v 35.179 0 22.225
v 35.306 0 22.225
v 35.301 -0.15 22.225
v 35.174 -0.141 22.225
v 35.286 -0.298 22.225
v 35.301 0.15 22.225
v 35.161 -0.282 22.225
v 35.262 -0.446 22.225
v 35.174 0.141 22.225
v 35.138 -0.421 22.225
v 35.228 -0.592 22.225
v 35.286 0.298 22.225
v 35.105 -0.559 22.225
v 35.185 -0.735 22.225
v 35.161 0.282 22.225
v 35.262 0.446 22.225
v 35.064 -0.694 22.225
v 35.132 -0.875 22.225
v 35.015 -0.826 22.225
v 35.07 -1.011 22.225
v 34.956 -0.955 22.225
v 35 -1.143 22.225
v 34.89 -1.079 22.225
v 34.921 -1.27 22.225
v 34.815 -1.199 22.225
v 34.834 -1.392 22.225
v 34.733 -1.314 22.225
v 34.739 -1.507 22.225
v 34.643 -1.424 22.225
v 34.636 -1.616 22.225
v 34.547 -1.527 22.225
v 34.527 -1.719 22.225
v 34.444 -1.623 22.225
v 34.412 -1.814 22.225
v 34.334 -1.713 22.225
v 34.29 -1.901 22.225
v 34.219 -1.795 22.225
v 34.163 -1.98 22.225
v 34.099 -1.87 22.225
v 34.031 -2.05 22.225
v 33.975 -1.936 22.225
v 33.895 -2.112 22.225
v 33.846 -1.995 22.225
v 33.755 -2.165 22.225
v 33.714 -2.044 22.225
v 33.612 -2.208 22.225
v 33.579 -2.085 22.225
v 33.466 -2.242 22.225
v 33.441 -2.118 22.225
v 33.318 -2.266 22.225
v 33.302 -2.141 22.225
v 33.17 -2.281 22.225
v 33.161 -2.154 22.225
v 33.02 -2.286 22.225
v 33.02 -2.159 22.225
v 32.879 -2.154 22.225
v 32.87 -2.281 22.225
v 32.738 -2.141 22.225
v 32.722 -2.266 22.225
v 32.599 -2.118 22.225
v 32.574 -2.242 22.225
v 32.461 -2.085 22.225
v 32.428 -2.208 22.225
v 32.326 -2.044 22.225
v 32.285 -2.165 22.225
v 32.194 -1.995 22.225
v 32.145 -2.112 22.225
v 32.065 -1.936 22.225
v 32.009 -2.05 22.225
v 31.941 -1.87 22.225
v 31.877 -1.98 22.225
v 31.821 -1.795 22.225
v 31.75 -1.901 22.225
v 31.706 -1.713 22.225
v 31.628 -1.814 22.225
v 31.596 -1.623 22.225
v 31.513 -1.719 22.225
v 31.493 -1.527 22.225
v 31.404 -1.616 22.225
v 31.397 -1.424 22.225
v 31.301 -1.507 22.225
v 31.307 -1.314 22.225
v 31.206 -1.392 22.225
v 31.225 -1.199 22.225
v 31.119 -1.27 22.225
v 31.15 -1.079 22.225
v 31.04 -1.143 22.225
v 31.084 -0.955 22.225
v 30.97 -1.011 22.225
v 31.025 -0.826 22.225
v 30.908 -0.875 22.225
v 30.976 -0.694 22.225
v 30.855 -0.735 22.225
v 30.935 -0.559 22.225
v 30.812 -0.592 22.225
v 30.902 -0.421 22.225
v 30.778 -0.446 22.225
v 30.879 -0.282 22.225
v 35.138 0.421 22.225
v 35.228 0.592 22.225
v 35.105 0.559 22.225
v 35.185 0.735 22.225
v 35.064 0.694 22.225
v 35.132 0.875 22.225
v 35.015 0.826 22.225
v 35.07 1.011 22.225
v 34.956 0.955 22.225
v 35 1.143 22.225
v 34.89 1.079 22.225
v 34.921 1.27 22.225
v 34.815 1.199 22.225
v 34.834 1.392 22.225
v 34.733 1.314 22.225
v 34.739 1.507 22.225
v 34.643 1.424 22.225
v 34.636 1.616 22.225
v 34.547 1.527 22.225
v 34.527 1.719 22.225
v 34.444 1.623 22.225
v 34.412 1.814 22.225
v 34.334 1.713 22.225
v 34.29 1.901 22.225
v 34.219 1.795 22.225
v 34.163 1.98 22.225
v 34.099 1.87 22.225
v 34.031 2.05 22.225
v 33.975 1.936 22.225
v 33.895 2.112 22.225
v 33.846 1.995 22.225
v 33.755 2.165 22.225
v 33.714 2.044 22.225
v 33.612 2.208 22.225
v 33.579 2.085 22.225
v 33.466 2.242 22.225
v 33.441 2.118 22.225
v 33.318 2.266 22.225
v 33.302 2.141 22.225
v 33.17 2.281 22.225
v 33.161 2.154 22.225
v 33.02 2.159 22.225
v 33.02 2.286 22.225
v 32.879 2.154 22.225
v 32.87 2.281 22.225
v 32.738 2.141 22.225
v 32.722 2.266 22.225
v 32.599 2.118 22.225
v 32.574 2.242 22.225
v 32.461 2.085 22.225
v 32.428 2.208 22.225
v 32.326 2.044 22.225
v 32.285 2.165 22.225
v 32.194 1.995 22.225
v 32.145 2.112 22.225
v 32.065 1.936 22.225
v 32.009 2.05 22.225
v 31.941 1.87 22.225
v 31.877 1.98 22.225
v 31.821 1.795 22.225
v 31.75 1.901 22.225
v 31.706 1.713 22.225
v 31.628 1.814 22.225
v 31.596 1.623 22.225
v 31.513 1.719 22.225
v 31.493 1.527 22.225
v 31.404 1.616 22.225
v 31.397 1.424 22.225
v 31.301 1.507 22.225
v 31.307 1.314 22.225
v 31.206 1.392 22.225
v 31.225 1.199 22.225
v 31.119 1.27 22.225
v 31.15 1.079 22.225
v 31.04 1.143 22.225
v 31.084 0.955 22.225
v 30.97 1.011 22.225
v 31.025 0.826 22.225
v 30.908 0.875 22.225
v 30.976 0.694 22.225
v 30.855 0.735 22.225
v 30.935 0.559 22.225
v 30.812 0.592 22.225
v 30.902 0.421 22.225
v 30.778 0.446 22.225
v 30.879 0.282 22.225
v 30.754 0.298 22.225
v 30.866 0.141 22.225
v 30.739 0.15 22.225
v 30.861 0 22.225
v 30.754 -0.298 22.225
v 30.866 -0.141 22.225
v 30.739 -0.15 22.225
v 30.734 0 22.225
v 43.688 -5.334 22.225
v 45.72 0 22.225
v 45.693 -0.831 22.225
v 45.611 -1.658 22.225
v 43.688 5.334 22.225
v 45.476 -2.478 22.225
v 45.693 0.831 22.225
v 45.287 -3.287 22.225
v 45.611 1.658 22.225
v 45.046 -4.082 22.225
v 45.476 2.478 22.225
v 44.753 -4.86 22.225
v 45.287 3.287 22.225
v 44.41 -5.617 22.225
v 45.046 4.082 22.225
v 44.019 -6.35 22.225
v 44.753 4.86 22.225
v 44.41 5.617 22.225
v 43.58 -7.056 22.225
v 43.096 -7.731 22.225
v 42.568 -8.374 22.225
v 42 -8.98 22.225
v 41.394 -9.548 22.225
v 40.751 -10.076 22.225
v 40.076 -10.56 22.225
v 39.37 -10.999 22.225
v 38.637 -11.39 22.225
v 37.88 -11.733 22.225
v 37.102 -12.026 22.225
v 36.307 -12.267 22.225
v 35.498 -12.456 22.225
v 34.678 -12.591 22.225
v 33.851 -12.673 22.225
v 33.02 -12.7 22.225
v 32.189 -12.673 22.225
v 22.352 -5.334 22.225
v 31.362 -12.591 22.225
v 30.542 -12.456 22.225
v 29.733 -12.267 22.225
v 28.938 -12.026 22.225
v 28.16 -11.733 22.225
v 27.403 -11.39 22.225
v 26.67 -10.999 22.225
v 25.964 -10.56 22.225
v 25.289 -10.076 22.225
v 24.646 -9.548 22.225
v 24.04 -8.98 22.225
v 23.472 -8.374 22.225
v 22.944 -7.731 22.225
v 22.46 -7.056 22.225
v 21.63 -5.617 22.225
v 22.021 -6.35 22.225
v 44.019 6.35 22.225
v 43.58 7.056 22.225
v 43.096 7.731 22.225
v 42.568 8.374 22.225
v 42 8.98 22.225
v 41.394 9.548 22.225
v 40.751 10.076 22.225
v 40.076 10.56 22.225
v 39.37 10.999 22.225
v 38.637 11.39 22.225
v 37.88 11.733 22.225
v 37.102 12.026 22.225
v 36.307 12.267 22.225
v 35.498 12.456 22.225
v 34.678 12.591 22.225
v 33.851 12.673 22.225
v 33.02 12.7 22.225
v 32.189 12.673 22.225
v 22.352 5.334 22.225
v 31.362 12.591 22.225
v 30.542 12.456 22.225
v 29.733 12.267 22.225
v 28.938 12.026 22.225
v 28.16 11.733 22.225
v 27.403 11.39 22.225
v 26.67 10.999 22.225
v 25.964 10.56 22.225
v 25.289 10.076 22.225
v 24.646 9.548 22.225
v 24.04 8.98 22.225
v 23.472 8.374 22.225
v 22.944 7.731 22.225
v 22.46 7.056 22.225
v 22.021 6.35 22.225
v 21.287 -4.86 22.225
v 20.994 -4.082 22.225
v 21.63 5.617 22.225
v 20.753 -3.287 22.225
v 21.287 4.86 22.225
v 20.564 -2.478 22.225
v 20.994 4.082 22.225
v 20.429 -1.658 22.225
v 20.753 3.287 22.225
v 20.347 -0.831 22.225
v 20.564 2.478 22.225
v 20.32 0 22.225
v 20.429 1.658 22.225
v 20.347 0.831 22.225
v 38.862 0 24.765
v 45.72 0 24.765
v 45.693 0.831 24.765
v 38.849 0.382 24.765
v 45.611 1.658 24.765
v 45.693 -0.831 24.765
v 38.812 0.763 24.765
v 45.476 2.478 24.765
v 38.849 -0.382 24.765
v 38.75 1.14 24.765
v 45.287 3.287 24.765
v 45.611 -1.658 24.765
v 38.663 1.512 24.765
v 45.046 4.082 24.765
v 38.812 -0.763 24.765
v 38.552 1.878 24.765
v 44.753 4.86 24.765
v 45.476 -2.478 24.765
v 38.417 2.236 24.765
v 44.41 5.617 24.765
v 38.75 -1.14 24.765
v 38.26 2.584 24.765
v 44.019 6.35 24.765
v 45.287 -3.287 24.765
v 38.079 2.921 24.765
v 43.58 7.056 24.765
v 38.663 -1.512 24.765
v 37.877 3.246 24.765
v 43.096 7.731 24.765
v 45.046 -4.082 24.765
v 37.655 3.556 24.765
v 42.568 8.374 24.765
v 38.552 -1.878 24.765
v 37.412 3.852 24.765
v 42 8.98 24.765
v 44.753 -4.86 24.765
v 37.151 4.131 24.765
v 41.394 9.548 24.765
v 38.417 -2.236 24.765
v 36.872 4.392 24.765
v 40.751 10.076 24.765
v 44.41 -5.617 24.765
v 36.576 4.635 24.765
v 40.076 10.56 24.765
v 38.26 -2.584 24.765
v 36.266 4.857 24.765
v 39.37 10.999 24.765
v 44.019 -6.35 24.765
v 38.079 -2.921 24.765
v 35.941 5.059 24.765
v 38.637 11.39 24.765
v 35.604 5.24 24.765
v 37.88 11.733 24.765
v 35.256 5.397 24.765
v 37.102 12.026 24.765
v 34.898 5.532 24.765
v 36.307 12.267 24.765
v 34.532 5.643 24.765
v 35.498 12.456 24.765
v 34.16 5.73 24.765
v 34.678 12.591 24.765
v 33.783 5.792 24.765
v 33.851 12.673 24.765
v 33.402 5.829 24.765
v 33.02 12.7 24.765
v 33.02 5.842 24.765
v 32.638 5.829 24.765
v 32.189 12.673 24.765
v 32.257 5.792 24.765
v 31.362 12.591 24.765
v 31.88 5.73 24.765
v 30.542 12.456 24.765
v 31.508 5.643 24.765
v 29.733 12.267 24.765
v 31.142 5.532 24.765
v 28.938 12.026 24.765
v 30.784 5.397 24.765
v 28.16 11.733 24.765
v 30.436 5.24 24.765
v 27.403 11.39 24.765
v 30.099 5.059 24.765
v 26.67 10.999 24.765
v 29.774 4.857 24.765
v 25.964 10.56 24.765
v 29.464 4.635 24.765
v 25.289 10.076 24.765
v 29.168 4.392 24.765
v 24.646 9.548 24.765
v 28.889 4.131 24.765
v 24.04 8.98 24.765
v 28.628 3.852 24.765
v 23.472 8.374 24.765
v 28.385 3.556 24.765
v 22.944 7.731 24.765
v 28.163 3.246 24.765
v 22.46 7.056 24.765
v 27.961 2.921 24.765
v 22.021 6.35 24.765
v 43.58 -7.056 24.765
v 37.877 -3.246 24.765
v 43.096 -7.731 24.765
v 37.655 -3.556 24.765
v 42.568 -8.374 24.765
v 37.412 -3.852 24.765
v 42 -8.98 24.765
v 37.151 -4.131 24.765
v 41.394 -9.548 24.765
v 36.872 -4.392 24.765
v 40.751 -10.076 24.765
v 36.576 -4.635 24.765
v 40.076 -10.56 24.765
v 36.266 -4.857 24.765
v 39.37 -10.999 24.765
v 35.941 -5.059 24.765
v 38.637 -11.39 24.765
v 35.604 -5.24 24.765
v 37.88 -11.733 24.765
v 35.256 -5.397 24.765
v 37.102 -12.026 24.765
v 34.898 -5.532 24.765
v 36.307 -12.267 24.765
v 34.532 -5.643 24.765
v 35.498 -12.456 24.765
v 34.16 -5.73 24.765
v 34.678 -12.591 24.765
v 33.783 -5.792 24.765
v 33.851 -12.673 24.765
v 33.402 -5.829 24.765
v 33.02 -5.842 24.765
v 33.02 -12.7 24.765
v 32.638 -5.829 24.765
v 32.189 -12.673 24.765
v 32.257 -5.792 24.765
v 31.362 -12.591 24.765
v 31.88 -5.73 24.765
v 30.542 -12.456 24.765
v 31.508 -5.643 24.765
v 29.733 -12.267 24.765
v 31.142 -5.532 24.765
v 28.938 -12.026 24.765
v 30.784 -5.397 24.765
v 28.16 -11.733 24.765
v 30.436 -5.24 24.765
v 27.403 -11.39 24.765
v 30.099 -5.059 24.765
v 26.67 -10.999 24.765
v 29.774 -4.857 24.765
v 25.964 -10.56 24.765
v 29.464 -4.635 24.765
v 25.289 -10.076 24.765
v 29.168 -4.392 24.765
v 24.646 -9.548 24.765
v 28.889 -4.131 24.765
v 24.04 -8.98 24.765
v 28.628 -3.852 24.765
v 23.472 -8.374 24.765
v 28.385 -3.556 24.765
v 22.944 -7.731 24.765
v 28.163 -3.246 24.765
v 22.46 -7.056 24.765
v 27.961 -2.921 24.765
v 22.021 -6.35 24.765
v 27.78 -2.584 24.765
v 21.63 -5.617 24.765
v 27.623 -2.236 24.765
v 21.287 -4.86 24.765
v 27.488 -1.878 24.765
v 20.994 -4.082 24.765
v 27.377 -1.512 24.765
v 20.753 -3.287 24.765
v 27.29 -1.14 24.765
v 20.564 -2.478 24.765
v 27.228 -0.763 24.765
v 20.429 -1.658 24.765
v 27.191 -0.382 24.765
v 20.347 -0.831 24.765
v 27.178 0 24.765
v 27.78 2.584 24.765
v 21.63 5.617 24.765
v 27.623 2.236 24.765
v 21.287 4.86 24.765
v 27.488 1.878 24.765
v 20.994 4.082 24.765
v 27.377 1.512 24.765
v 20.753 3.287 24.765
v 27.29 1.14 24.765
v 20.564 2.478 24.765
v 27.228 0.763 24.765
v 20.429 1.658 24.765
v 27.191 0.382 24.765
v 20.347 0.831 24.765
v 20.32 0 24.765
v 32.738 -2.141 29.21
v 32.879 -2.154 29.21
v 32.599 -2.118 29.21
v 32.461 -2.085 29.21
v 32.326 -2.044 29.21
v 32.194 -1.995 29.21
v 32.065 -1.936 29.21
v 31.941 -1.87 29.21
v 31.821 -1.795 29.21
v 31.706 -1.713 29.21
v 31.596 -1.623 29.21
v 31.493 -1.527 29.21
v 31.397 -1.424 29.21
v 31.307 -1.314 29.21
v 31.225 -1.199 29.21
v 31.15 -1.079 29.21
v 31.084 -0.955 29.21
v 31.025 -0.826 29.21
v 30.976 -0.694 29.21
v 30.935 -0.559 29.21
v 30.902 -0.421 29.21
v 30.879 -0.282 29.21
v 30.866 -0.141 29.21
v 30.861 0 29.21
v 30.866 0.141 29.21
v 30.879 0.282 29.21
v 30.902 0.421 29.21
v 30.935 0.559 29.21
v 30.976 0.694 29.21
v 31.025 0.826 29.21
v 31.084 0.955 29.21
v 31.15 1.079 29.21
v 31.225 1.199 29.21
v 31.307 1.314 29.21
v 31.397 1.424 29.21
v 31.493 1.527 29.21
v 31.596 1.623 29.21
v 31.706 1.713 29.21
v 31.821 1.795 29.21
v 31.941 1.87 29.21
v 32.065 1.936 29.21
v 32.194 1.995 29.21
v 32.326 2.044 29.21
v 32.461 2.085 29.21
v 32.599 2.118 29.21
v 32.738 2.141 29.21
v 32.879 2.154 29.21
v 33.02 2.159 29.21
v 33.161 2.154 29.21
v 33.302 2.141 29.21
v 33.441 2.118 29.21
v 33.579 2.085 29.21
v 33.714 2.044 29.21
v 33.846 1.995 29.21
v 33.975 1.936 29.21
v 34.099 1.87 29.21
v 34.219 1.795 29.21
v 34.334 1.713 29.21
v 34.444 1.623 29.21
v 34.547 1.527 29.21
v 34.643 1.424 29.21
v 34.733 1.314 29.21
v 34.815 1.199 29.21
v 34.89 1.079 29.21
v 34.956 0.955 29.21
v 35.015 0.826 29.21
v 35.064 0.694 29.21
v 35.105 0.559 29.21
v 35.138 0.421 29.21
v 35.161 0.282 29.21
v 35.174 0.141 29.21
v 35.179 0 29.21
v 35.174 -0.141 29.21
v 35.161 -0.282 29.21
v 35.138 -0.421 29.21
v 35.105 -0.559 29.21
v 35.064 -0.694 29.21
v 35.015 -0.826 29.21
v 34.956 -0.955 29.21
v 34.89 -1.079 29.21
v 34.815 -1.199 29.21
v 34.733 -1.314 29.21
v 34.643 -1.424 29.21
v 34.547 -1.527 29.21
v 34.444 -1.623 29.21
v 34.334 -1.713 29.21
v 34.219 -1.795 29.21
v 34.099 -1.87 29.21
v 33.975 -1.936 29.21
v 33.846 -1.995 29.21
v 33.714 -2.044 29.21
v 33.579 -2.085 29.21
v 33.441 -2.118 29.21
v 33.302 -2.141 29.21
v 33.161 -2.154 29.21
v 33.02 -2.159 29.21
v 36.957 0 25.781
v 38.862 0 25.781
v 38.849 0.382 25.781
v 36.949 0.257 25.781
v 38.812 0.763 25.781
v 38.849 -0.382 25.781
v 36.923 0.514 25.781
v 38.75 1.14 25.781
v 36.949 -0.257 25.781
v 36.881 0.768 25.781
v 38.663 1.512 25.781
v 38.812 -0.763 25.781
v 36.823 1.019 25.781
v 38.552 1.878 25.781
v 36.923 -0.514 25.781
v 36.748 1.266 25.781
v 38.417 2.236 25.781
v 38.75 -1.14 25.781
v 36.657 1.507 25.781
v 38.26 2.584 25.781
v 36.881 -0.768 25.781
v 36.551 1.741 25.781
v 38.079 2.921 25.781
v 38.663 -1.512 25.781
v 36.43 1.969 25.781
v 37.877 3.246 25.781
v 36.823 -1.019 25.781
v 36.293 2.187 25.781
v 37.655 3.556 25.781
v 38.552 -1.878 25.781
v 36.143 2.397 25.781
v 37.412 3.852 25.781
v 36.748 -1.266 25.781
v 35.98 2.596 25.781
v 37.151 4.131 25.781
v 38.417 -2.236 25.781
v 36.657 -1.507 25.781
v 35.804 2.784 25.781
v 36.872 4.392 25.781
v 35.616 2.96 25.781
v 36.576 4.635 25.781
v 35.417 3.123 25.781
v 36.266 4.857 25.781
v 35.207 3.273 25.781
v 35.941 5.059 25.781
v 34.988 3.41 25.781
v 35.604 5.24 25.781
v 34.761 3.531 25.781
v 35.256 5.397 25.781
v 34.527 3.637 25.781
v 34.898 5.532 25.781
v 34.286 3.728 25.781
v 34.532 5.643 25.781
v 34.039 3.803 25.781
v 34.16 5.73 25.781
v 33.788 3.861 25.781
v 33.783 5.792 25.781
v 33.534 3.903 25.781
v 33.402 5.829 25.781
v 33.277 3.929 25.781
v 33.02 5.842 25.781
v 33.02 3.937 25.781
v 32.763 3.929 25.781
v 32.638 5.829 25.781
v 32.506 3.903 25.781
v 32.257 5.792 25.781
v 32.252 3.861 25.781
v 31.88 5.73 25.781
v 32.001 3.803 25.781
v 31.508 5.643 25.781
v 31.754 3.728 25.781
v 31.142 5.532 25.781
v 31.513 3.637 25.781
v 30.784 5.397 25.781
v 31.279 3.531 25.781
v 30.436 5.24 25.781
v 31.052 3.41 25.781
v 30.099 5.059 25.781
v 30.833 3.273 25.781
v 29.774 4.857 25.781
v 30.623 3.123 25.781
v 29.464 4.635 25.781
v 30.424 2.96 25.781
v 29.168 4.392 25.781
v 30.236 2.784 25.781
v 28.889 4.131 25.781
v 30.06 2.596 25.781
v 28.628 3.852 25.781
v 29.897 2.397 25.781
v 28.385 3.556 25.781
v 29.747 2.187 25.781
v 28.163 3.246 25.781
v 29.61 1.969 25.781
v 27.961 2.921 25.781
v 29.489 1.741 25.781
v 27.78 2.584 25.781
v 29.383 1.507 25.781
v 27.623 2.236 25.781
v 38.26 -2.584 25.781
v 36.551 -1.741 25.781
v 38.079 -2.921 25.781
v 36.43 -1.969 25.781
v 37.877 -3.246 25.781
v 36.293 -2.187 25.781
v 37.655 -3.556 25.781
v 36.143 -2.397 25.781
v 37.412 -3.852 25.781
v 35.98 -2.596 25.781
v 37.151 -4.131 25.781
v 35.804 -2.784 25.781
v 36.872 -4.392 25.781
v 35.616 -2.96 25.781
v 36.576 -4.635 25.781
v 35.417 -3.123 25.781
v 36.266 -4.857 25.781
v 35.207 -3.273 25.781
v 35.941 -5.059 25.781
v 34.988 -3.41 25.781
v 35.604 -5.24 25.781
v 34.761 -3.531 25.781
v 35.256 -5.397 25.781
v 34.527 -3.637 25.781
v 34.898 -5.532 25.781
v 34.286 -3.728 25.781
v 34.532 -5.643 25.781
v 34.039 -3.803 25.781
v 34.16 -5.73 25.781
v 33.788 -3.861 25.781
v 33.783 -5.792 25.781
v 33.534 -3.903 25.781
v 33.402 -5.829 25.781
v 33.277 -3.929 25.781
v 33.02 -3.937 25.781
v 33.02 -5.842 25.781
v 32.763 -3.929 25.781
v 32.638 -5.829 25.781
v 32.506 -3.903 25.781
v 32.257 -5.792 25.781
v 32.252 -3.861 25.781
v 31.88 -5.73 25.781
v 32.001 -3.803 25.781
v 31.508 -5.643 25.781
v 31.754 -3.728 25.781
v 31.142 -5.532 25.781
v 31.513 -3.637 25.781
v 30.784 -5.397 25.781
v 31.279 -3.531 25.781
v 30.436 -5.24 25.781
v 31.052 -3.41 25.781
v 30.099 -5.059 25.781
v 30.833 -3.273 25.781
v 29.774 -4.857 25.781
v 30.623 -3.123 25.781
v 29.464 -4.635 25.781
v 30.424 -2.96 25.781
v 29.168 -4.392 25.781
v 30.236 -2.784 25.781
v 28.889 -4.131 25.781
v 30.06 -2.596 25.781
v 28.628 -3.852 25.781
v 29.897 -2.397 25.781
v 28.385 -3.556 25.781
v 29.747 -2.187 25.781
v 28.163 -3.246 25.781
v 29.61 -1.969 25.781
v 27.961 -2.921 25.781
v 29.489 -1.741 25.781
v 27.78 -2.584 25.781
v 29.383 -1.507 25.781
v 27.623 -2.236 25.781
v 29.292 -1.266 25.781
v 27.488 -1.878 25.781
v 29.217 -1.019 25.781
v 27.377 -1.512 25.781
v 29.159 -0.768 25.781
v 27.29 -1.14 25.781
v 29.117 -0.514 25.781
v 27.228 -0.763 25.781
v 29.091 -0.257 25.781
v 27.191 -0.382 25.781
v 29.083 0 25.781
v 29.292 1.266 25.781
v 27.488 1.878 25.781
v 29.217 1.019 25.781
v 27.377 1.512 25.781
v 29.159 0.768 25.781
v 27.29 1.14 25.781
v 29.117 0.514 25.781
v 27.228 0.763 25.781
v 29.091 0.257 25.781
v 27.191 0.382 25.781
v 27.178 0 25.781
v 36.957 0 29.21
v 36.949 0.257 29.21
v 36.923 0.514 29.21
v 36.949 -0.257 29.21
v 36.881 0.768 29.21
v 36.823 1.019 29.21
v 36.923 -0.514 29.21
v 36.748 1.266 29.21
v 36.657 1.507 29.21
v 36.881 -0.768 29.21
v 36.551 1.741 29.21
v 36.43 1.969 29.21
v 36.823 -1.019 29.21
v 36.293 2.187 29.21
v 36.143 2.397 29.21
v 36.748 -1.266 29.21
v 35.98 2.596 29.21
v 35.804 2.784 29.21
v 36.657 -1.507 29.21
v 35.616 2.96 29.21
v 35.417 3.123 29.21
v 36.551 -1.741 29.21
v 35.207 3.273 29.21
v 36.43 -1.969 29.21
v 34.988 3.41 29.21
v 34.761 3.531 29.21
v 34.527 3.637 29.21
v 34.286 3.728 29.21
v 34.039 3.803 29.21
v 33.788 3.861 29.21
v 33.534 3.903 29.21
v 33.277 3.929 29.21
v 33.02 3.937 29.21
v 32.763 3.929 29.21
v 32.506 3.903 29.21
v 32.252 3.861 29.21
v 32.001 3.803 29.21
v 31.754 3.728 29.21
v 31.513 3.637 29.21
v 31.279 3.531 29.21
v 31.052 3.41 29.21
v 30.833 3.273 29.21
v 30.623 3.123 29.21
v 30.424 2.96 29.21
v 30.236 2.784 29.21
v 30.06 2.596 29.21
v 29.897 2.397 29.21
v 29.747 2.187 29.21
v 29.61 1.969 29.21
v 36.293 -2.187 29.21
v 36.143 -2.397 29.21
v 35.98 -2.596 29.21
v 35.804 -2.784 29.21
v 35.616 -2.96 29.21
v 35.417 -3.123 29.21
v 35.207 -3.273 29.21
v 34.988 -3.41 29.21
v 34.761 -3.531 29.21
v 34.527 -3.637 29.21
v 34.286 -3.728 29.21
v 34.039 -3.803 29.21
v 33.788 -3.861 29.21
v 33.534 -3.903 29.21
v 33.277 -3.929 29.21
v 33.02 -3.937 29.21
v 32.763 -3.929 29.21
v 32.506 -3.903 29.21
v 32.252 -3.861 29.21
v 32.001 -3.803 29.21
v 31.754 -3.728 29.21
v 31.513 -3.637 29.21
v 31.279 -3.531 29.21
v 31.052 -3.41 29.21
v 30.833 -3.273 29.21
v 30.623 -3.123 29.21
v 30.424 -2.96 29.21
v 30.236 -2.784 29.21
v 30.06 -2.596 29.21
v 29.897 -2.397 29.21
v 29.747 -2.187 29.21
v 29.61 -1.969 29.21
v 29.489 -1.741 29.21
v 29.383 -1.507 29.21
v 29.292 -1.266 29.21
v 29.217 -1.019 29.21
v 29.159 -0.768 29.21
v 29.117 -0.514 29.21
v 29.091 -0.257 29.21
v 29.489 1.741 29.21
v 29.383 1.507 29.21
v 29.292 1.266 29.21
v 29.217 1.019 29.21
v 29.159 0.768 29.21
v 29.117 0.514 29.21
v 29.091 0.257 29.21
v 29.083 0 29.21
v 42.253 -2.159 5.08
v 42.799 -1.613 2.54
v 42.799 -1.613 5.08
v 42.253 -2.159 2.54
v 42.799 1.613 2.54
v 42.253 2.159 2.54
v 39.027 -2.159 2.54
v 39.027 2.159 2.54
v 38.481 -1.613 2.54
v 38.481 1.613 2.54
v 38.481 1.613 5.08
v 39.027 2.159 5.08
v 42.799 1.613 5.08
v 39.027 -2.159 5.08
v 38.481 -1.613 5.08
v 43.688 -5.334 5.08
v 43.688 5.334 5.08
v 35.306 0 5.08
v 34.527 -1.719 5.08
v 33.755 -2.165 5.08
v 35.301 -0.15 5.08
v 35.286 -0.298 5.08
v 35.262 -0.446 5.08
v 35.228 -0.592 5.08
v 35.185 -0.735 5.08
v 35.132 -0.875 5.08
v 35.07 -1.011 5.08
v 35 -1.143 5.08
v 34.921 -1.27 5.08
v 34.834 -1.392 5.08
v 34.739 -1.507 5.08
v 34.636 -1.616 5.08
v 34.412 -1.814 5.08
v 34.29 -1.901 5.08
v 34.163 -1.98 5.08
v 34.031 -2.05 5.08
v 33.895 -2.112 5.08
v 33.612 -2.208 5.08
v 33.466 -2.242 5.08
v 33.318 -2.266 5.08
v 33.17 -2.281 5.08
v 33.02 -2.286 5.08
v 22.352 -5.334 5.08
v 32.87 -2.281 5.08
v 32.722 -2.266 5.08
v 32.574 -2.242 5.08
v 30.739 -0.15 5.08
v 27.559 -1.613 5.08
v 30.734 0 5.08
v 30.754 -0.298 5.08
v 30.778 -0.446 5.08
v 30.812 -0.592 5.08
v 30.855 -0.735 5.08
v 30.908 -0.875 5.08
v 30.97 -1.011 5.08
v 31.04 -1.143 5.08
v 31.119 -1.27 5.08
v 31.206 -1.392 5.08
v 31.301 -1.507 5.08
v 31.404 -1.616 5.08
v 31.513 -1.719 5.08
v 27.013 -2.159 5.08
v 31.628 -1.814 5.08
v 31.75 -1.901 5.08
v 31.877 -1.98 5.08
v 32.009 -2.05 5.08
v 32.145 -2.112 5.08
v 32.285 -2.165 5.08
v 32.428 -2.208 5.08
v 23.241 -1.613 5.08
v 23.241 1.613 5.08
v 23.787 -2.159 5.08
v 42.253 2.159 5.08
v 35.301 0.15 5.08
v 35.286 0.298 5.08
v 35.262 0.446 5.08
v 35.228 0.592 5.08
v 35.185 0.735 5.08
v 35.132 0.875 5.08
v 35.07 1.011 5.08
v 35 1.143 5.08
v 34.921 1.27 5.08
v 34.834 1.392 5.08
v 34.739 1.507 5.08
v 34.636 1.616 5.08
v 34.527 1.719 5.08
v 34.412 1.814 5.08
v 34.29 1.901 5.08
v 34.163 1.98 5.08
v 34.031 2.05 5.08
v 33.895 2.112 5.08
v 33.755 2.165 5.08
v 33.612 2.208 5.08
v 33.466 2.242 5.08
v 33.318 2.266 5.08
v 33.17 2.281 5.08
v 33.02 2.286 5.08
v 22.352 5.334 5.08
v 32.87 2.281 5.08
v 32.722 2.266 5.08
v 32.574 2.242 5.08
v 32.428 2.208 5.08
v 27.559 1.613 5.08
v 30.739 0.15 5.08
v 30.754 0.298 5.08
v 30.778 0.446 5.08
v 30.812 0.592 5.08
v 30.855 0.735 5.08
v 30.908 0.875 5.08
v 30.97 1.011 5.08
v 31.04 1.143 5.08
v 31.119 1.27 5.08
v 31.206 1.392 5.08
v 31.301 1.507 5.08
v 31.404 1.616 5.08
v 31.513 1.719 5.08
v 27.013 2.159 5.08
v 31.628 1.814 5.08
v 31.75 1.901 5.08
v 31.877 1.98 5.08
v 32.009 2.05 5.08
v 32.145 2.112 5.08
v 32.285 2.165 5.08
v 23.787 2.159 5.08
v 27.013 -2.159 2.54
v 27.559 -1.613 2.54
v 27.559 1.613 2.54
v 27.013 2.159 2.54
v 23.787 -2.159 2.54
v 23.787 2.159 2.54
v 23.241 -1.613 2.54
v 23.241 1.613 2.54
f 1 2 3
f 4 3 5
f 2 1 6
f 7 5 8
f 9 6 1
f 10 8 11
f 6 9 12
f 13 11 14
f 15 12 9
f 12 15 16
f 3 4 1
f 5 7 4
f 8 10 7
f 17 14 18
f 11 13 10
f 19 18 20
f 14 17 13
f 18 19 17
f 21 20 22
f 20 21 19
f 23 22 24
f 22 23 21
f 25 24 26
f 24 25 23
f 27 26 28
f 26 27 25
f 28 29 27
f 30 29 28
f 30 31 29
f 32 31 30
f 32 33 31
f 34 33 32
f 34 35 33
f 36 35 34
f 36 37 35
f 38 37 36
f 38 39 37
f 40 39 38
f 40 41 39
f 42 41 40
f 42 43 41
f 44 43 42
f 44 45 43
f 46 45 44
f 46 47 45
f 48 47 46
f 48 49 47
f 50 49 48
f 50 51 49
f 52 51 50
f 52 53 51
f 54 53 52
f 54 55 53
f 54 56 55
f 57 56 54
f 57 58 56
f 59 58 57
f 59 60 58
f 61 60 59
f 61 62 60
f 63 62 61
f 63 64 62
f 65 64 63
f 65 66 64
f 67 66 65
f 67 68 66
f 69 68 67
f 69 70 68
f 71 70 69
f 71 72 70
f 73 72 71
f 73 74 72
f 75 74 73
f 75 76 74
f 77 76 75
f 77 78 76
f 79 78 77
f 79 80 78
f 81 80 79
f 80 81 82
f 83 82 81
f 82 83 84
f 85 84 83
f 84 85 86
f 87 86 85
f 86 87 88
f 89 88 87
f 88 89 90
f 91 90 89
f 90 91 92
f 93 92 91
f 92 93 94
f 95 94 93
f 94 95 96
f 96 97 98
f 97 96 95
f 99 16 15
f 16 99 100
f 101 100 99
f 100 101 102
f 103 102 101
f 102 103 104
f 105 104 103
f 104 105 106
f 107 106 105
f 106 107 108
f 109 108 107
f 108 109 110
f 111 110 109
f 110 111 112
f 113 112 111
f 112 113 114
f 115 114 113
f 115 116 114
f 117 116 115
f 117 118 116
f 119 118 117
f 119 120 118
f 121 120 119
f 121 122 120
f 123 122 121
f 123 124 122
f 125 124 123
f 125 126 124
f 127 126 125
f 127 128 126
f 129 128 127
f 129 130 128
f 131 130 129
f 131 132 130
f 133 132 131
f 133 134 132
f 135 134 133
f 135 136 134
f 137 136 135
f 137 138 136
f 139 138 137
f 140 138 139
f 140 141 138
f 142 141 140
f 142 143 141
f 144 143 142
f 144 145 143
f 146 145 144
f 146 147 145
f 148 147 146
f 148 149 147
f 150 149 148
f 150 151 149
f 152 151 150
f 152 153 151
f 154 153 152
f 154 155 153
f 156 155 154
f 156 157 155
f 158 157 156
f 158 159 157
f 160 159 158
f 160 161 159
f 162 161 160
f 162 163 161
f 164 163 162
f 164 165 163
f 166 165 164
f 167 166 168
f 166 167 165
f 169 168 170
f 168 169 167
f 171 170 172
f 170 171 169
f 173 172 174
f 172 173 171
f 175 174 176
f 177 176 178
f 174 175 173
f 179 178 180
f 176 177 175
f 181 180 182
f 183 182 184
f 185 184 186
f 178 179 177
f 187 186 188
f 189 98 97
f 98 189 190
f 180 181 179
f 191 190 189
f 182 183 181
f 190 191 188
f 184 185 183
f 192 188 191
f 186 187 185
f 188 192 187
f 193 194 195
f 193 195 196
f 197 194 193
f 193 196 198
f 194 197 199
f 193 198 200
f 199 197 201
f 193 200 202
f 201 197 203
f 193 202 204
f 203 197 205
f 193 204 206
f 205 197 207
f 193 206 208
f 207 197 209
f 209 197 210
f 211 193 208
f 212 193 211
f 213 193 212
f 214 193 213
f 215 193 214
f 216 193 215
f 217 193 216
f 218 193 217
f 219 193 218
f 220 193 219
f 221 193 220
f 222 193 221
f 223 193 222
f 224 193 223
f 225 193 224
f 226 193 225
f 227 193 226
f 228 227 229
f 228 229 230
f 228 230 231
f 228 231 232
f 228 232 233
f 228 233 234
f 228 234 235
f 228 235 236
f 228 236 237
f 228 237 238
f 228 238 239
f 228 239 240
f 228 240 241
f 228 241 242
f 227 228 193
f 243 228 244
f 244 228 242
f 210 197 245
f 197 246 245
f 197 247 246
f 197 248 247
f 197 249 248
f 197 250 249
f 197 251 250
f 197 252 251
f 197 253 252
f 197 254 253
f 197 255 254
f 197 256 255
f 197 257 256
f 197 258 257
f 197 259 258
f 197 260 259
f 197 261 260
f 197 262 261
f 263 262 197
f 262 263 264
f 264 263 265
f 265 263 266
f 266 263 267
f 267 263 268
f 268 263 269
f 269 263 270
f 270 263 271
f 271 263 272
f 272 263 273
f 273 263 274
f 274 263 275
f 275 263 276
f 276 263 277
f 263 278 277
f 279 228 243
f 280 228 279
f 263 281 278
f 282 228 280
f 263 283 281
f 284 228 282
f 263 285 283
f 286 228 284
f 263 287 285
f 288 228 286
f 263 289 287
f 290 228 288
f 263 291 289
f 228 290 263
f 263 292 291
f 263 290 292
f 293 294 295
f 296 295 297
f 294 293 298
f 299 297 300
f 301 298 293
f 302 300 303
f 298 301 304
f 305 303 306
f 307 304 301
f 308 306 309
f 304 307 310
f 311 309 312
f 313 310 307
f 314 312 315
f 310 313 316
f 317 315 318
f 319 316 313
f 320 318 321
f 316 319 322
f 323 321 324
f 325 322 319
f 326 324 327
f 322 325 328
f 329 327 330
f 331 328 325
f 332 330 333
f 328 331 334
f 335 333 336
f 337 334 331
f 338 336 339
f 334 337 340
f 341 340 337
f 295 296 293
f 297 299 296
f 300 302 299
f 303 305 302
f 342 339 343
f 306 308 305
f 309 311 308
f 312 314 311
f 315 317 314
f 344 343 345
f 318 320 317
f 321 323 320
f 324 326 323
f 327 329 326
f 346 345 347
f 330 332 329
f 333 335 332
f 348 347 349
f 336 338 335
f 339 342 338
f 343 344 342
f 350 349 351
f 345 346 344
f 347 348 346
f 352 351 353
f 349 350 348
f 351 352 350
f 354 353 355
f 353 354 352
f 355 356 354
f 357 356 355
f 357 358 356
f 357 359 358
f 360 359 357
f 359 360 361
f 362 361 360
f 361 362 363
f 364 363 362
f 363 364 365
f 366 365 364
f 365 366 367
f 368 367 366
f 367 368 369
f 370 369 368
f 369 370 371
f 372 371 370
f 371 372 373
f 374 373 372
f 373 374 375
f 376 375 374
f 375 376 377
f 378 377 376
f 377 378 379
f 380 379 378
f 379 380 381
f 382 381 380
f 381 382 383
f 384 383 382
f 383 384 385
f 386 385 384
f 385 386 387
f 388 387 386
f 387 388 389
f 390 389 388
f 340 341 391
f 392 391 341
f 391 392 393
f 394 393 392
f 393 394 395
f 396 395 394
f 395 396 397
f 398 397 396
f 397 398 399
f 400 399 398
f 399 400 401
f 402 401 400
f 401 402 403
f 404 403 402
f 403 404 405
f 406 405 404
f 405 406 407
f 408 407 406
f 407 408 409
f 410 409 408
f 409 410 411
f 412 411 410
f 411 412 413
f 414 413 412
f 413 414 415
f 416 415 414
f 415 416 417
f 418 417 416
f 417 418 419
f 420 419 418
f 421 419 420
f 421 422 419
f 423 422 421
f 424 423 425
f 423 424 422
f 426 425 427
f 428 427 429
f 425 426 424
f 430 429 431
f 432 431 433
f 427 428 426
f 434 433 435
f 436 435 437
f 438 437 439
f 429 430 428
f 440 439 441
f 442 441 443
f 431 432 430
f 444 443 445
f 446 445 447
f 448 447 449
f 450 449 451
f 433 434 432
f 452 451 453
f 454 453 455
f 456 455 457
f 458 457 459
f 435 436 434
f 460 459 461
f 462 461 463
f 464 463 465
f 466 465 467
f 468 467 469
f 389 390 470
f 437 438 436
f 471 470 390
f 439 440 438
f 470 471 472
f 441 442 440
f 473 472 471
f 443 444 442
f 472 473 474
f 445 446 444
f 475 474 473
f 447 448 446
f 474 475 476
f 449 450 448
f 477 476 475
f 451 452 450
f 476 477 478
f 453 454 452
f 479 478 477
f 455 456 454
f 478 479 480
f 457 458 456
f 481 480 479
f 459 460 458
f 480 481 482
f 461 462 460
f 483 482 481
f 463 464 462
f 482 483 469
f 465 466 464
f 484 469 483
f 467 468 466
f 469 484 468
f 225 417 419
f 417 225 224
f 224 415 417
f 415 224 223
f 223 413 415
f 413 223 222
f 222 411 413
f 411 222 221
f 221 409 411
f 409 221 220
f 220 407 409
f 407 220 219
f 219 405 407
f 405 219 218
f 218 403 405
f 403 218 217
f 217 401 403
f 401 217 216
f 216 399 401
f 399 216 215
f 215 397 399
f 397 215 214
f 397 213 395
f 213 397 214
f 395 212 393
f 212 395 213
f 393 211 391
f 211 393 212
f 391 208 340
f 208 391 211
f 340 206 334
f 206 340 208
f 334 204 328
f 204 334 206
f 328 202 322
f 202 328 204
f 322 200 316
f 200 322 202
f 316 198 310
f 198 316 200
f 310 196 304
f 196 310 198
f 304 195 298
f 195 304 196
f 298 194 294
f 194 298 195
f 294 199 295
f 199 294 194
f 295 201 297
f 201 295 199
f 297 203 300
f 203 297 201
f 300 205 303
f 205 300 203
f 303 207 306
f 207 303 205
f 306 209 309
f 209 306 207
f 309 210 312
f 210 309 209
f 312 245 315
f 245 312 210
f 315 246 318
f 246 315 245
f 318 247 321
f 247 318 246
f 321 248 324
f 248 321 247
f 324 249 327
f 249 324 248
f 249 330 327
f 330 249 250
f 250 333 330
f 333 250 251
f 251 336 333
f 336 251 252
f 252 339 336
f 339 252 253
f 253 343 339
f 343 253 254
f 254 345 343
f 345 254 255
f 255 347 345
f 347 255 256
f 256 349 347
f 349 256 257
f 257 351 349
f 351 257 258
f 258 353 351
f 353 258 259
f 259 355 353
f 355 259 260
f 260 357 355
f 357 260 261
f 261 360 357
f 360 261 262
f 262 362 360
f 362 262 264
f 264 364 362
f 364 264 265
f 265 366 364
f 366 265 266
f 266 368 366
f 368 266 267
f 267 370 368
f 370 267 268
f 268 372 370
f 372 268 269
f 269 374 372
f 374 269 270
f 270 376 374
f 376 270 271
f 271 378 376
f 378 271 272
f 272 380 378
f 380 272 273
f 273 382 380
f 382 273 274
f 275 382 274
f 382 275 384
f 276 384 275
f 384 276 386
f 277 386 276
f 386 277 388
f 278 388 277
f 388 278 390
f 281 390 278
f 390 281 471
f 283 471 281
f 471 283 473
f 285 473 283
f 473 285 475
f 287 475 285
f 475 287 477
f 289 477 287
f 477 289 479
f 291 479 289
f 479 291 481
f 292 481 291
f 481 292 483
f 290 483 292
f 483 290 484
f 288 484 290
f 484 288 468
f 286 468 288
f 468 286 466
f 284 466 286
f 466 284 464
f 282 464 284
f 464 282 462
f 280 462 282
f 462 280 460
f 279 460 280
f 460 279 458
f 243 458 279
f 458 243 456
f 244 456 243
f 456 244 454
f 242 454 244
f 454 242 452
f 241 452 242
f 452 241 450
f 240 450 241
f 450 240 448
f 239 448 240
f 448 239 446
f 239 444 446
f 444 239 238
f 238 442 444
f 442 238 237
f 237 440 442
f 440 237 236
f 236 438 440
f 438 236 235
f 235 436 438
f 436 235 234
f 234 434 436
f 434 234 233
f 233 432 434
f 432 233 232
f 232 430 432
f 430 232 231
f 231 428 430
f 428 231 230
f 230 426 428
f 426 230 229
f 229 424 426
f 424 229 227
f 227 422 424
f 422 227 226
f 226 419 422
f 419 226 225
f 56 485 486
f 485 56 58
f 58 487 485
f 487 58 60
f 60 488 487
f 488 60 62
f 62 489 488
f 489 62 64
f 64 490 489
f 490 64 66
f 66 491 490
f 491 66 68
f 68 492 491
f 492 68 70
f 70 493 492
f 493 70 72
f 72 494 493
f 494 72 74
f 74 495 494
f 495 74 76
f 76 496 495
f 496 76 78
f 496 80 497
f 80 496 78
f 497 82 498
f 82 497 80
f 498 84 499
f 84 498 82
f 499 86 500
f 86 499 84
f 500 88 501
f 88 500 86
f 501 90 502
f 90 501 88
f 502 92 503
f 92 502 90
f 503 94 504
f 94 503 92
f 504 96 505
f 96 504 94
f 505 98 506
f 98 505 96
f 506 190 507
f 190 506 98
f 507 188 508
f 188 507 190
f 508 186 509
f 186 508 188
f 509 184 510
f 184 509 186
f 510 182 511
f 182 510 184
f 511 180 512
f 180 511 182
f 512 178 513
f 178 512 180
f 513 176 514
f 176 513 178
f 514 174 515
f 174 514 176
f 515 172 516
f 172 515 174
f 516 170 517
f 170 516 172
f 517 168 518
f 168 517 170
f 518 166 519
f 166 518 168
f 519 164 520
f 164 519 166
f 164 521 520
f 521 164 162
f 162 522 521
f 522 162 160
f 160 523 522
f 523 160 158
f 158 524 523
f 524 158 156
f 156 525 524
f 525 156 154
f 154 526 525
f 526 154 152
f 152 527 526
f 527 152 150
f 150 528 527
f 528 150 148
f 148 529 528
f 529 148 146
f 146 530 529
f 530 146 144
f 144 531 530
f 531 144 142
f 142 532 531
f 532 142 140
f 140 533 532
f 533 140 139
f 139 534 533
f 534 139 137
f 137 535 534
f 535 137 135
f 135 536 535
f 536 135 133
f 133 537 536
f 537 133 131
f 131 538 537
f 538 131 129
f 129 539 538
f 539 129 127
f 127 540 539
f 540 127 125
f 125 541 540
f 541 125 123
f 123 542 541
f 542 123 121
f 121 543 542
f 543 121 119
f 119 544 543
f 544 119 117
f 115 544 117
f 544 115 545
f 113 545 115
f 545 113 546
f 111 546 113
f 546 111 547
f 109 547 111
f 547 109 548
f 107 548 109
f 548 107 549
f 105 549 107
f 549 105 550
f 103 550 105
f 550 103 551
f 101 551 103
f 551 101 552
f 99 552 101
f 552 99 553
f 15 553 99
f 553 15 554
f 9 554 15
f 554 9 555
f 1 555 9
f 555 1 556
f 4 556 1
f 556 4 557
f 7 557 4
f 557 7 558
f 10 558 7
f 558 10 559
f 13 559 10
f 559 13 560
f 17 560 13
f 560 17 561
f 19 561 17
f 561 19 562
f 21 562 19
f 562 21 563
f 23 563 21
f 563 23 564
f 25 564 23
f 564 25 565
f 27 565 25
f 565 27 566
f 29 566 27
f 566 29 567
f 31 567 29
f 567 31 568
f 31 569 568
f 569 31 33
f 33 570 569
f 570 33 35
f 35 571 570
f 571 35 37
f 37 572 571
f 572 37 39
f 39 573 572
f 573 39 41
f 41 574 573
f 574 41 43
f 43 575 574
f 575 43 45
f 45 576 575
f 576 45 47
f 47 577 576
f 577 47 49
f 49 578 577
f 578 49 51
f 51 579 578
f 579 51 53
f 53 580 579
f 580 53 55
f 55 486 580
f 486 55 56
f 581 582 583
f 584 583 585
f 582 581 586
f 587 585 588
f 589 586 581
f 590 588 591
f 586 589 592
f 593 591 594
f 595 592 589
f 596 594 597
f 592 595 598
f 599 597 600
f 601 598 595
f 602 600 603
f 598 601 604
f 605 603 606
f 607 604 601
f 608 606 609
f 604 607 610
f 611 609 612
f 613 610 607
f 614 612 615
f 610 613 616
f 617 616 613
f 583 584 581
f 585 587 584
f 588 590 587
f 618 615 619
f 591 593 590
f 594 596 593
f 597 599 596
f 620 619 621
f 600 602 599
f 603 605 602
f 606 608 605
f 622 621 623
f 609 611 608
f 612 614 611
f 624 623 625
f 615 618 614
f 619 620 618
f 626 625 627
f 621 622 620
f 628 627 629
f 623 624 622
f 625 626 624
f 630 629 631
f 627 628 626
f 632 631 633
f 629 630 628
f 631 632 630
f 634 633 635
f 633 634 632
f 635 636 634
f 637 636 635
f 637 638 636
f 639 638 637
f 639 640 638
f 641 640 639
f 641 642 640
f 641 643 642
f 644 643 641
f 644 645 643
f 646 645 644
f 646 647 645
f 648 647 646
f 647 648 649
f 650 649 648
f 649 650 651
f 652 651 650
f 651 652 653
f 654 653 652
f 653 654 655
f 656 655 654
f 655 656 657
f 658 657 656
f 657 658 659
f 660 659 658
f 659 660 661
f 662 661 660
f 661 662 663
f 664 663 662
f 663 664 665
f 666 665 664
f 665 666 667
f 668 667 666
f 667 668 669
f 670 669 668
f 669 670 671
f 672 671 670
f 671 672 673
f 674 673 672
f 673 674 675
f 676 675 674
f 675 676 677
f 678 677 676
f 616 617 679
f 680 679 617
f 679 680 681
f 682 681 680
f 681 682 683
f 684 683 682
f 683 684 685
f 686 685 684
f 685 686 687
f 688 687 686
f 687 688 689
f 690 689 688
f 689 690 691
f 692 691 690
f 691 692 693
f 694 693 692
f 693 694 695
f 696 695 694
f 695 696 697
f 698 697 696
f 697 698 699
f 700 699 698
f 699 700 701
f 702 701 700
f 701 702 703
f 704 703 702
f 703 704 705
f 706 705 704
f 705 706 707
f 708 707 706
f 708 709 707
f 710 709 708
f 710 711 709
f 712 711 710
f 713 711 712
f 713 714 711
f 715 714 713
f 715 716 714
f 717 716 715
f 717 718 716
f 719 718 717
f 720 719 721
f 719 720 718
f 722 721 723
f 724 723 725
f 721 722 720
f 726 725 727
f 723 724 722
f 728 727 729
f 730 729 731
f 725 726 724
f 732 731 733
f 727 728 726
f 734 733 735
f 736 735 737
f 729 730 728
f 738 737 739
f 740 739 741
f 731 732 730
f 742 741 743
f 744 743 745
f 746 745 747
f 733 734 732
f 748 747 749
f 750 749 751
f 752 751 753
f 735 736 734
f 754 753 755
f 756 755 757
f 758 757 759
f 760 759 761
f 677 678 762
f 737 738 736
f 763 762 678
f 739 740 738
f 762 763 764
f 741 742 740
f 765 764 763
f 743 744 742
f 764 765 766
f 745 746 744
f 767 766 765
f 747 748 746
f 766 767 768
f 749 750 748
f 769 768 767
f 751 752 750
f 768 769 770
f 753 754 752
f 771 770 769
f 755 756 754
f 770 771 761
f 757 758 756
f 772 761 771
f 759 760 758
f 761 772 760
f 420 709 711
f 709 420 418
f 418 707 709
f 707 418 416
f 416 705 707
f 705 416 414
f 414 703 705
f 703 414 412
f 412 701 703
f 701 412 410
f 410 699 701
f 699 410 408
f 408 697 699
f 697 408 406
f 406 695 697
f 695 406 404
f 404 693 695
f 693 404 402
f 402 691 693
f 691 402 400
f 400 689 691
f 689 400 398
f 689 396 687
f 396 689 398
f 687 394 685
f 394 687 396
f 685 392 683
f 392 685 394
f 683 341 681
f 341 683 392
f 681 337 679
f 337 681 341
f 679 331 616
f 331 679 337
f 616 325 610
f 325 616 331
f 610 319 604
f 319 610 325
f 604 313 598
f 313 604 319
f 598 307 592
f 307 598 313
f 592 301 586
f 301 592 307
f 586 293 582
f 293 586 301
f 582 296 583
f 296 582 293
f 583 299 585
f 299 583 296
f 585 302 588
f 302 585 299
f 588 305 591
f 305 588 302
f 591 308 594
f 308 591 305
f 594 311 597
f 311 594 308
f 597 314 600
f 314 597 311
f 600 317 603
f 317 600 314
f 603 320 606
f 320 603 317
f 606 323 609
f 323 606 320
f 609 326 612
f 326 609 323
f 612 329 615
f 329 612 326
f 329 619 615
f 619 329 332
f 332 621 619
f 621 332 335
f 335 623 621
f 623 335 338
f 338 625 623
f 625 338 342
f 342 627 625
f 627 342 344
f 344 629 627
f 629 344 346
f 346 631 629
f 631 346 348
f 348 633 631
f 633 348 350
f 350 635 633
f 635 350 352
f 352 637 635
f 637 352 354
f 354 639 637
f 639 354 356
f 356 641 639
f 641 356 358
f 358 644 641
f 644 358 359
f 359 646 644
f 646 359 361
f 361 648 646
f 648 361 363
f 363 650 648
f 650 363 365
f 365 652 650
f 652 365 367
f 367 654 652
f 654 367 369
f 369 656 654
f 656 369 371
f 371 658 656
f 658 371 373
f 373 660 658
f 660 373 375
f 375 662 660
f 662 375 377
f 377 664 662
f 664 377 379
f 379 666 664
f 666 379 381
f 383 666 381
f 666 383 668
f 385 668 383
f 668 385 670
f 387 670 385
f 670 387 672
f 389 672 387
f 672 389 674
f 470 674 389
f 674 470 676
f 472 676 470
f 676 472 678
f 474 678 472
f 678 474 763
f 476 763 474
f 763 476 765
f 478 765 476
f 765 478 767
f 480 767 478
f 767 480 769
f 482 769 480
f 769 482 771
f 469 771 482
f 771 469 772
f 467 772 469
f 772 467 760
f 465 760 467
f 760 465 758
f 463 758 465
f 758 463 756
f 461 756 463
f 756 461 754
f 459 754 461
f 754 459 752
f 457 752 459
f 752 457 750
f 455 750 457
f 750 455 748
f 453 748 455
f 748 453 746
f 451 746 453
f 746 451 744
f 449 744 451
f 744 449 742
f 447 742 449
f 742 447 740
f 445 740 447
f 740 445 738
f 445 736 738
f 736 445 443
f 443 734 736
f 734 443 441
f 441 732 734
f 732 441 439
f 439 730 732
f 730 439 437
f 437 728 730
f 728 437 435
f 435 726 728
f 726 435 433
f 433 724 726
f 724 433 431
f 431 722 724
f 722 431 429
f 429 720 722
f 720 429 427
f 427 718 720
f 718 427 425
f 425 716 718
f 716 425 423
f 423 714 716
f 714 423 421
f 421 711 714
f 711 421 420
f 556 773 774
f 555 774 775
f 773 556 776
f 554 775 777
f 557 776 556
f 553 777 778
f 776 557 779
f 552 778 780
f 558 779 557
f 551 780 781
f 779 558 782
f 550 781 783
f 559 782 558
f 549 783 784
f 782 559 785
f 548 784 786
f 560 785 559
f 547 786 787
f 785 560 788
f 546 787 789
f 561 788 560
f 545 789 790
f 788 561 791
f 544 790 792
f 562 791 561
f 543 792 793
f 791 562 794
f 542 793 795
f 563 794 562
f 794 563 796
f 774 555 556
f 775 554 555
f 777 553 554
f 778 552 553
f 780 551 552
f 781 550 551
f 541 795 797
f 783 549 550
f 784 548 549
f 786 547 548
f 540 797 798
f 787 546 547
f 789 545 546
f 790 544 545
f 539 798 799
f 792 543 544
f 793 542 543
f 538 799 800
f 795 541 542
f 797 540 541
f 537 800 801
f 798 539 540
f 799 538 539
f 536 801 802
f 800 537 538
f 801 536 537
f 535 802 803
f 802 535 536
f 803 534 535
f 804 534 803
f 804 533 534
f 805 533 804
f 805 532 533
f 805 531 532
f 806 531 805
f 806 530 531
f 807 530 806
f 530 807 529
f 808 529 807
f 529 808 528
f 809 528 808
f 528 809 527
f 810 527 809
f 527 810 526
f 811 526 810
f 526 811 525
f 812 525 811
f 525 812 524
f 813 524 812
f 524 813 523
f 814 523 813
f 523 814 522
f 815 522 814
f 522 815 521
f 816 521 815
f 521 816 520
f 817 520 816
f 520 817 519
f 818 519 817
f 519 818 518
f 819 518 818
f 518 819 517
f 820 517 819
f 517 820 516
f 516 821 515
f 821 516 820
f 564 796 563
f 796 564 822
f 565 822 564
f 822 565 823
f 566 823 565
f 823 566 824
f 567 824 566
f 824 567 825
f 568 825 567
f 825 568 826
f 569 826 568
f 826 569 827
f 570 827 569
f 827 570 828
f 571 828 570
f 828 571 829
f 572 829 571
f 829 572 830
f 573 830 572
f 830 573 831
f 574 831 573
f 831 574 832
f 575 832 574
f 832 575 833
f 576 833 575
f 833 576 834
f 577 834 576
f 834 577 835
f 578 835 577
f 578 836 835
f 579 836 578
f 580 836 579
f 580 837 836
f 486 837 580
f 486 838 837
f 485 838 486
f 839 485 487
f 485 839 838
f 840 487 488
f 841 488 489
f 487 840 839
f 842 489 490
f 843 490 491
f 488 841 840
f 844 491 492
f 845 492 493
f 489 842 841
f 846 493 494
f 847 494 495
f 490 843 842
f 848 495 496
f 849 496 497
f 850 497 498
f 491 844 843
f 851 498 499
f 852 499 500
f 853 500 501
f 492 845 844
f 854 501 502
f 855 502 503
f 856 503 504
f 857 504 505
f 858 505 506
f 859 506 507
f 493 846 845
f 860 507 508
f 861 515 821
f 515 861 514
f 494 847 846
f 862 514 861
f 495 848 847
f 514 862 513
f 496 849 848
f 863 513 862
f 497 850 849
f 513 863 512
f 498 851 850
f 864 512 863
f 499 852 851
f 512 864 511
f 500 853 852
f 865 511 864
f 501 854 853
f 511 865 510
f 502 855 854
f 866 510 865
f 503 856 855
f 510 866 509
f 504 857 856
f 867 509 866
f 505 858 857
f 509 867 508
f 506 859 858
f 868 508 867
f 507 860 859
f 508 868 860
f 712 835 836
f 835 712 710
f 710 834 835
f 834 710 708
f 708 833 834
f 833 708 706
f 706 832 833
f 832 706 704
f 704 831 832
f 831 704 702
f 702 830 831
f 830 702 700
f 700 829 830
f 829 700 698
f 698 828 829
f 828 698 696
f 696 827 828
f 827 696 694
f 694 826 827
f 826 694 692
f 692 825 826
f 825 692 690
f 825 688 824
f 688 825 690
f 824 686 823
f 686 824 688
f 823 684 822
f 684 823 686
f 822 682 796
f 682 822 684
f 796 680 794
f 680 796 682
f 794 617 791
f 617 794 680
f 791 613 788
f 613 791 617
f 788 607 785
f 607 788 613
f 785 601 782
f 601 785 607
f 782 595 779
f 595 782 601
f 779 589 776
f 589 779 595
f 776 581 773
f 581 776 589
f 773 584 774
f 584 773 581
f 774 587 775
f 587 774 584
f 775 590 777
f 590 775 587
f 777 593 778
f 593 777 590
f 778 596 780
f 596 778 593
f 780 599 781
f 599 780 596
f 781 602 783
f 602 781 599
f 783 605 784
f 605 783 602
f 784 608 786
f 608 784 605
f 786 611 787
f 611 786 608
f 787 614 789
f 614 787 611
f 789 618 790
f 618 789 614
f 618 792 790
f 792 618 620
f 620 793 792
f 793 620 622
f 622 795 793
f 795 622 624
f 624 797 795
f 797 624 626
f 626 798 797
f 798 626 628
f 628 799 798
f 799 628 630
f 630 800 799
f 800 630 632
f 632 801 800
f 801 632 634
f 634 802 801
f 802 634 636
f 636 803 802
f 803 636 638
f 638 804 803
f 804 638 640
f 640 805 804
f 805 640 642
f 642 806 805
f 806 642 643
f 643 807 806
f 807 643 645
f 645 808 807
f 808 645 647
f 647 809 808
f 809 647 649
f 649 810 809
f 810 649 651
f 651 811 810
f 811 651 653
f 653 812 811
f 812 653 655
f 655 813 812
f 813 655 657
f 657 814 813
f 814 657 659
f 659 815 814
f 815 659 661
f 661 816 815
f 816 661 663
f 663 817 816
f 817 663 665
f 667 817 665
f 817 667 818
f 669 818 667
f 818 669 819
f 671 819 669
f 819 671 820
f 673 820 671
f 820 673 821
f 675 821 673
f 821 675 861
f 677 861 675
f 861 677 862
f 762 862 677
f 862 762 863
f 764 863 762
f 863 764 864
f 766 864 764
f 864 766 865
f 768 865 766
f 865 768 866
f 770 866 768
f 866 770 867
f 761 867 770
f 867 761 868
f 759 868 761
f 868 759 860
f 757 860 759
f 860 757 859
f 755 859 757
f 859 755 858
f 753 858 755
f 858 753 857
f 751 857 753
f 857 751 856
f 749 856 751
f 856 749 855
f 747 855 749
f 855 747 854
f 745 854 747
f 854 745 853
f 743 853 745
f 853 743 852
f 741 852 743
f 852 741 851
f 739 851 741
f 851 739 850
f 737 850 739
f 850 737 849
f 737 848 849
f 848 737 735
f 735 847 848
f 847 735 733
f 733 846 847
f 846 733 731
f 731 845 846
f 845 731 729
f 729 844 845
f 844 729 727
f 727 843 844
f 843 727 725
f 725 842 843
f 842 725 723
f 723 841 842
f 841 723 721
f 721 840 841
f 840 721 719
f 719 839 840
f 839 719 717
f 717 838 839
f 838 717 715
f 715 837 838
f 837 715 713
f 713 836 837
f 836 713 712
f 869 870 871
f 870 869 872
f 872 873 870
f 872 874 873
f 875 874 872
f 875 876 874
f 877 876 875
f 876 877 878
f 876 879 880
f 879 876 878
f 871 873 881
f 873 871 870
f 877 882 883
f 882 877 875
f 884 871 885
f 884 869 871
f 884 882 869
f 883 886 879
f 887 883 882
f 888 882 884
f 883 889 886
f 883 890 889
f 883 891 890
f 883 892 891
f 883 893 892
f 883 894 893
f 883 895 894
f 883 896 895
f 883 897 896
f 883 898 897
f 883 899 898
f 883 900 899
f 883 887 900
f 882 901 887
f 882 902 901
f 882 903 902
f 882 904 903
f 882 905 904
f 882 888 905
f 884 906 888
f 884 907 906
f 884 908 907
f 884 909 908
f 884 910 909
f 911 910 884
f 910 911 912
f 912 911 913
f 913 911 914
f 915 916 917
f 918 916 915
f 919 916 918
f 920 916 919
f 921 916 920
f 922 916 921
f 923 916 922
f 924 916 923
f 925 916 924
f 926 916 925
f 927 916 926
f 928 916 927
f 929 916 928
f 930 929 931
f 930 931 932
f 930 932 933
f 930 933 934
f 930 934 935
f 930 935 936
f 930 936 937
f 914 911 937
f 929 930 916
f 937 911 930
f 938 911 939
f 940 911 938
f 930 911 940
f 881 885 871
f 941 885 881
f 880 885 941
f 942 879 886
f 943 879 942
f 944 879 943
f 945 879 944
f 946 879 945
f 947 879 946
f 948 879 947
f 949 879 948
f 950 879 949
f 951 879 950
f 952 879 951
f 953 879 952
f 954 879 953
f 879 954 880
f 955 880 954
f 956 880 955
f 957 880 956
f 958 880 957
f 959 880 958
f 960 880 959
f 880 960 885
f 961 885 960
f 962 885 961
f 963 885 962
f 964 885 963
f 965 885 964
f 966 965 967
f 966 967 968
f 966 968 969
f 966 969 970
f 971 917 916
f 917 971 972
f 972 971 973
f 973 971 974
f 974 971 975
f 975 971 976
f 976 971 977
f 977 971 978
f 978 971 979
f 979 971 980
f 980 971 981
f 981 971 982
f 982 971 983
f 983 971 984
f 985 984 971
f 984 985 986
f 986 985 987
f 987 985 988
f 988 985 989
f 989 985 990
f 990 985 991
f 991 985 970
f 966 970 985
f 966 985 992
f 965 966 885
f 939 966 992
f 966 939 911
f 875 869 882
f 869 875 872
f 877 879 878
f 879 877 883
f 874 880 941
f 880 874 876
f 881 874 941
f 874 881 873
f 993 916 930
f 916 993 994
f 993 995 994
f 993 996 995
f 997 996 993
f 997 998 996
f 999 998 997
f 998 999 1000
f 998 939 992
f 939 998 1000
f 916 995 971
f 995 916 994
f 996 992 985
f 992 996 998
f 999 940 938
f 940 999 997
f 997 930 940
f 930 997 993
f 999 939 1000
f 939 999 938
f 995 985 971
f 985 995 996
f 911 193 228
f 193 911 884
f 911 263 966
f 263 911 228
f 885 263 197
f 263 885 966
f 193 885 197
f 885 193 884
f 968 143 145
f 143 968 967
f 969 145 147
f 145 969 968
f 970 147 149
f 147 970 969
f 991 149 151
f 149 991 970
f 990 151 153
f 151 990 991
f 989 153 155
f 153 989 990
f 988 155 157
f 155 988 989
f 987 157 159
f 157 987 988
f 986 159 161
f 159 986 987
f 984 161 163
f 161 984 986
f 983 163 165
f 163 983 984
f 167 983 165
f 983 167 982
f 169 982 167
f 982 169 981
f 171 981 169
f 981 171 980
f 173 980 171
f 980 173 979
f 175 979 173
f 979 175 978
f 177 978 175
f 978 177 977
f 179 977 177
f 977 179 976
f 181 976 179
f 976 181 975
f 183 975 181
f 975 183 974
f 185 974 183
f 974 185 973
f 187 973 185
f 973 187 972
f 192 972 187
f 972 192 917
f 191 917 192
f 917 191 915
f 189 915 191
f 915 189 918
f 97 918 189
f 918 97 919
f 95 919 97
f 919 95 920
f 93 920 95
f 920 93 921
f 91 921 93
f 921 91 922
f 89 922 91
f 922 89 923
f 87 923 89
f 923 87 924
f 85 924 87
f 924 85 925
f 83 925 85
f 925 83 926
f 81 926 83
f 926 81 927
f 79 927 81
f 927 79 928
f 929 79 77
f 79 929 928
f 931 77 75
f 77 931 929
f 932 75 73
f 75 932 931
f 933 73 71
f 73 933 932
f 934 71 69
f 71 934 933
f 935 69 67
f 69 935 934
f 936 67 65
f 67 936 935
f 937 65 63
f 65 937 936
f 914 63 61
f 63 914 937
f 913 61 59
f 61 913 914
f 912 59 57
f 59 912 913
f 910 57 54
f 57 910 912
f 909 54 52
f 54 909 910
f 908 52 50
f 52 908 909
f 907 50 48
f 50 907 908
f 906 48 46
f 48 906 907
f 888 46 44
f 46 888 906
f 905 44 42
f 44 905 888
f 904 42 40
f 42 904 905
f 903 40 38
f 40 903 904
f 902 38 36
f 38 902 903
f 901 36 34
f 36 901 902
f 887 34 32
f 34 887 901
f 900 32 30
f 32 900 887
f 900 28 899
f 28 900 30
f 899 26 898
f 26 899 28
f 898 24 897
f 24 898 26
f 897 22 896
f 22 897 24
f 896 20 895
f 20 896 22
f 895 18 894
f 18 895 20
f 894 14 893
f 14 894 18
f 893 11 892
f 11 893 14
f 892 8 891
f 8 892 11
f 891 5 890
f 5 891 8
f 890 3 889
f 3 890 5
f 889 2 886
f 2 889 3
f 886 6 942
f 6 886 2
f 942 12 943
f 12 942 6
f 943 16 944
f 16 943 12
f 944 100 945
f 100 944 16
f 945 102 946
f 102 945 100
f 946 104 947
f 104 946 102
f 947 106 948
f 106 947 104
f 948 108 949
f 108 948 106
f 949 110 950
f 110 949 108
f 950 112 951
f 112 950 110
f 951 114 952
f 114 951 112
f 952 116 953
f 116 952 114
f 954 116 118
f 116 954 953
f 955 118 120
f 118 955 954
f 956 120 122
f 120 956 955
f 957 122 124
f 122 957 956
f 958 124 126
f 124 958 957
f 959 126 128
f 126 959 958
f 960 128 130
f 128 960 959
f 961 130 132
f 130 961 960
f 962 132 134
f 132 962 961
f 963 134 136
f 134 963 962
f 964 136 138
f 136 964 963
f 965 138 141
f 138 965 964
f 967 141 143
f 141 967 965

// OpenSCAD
ViewScale = [0.0254, 0.0254, 0.0254];

module bump()
{
    linear_extrude(100)
    difference() {
    square([170, 170], center=true);
    for(ii=[45:90:315]) {
        rotate([0, 0, ii])
        translate([0, 120, 0])
        square([80, 30], center=true);
    }}
}

module bumps()
{
    *translate([250, 250, 0])
    bump();
    translate([300, 0, 0])
    bump();
    *translate([-250, 250, 0])
    bump();
    translate([-300, 0, 0])
    bump();
}

module mountmain()
{
    linear_extrude(675)
    difference() {
    square([840, 420], center=true);
//    for(ii=[45:90:315]) {
//        #rotate([0, 0, ii])
//        translate([0, 600, 0])
//        square([200, 100], center=true);
//    }
    circle(180/2, $fn=96);
    }
}

module disc()
{
    // disc
    linear_extrude(100)
    difference() {
        circle(1000/2, $fn=96);
        circle(170/2, $fn=96);
    }
    // spacer
    translate([0, 0, 100])
    linear_extrude(40)
    difference() {
        circle(460/2, $fn=96);
        circle(170/2, $fn=96);
    }
    // shaft
    translate([0, 0, 140])
    linear_extrude(270/2)
    difference() {
        circle(310/2, $fn=96);
        circle(170/2, $fn=96);
    }
}

module mount()
{
    // upper disk w/spacer and shaft
    rotate([180, 0, 0])
    disc();
    mountmain();
    // bumps + hole
    translate([0, 0, 675])
    bumps();
}


scale(ViewScale)
{
    *disc();
    translate([1300, 0, 875])
    rotate([180,0,0])
    mount();
}
